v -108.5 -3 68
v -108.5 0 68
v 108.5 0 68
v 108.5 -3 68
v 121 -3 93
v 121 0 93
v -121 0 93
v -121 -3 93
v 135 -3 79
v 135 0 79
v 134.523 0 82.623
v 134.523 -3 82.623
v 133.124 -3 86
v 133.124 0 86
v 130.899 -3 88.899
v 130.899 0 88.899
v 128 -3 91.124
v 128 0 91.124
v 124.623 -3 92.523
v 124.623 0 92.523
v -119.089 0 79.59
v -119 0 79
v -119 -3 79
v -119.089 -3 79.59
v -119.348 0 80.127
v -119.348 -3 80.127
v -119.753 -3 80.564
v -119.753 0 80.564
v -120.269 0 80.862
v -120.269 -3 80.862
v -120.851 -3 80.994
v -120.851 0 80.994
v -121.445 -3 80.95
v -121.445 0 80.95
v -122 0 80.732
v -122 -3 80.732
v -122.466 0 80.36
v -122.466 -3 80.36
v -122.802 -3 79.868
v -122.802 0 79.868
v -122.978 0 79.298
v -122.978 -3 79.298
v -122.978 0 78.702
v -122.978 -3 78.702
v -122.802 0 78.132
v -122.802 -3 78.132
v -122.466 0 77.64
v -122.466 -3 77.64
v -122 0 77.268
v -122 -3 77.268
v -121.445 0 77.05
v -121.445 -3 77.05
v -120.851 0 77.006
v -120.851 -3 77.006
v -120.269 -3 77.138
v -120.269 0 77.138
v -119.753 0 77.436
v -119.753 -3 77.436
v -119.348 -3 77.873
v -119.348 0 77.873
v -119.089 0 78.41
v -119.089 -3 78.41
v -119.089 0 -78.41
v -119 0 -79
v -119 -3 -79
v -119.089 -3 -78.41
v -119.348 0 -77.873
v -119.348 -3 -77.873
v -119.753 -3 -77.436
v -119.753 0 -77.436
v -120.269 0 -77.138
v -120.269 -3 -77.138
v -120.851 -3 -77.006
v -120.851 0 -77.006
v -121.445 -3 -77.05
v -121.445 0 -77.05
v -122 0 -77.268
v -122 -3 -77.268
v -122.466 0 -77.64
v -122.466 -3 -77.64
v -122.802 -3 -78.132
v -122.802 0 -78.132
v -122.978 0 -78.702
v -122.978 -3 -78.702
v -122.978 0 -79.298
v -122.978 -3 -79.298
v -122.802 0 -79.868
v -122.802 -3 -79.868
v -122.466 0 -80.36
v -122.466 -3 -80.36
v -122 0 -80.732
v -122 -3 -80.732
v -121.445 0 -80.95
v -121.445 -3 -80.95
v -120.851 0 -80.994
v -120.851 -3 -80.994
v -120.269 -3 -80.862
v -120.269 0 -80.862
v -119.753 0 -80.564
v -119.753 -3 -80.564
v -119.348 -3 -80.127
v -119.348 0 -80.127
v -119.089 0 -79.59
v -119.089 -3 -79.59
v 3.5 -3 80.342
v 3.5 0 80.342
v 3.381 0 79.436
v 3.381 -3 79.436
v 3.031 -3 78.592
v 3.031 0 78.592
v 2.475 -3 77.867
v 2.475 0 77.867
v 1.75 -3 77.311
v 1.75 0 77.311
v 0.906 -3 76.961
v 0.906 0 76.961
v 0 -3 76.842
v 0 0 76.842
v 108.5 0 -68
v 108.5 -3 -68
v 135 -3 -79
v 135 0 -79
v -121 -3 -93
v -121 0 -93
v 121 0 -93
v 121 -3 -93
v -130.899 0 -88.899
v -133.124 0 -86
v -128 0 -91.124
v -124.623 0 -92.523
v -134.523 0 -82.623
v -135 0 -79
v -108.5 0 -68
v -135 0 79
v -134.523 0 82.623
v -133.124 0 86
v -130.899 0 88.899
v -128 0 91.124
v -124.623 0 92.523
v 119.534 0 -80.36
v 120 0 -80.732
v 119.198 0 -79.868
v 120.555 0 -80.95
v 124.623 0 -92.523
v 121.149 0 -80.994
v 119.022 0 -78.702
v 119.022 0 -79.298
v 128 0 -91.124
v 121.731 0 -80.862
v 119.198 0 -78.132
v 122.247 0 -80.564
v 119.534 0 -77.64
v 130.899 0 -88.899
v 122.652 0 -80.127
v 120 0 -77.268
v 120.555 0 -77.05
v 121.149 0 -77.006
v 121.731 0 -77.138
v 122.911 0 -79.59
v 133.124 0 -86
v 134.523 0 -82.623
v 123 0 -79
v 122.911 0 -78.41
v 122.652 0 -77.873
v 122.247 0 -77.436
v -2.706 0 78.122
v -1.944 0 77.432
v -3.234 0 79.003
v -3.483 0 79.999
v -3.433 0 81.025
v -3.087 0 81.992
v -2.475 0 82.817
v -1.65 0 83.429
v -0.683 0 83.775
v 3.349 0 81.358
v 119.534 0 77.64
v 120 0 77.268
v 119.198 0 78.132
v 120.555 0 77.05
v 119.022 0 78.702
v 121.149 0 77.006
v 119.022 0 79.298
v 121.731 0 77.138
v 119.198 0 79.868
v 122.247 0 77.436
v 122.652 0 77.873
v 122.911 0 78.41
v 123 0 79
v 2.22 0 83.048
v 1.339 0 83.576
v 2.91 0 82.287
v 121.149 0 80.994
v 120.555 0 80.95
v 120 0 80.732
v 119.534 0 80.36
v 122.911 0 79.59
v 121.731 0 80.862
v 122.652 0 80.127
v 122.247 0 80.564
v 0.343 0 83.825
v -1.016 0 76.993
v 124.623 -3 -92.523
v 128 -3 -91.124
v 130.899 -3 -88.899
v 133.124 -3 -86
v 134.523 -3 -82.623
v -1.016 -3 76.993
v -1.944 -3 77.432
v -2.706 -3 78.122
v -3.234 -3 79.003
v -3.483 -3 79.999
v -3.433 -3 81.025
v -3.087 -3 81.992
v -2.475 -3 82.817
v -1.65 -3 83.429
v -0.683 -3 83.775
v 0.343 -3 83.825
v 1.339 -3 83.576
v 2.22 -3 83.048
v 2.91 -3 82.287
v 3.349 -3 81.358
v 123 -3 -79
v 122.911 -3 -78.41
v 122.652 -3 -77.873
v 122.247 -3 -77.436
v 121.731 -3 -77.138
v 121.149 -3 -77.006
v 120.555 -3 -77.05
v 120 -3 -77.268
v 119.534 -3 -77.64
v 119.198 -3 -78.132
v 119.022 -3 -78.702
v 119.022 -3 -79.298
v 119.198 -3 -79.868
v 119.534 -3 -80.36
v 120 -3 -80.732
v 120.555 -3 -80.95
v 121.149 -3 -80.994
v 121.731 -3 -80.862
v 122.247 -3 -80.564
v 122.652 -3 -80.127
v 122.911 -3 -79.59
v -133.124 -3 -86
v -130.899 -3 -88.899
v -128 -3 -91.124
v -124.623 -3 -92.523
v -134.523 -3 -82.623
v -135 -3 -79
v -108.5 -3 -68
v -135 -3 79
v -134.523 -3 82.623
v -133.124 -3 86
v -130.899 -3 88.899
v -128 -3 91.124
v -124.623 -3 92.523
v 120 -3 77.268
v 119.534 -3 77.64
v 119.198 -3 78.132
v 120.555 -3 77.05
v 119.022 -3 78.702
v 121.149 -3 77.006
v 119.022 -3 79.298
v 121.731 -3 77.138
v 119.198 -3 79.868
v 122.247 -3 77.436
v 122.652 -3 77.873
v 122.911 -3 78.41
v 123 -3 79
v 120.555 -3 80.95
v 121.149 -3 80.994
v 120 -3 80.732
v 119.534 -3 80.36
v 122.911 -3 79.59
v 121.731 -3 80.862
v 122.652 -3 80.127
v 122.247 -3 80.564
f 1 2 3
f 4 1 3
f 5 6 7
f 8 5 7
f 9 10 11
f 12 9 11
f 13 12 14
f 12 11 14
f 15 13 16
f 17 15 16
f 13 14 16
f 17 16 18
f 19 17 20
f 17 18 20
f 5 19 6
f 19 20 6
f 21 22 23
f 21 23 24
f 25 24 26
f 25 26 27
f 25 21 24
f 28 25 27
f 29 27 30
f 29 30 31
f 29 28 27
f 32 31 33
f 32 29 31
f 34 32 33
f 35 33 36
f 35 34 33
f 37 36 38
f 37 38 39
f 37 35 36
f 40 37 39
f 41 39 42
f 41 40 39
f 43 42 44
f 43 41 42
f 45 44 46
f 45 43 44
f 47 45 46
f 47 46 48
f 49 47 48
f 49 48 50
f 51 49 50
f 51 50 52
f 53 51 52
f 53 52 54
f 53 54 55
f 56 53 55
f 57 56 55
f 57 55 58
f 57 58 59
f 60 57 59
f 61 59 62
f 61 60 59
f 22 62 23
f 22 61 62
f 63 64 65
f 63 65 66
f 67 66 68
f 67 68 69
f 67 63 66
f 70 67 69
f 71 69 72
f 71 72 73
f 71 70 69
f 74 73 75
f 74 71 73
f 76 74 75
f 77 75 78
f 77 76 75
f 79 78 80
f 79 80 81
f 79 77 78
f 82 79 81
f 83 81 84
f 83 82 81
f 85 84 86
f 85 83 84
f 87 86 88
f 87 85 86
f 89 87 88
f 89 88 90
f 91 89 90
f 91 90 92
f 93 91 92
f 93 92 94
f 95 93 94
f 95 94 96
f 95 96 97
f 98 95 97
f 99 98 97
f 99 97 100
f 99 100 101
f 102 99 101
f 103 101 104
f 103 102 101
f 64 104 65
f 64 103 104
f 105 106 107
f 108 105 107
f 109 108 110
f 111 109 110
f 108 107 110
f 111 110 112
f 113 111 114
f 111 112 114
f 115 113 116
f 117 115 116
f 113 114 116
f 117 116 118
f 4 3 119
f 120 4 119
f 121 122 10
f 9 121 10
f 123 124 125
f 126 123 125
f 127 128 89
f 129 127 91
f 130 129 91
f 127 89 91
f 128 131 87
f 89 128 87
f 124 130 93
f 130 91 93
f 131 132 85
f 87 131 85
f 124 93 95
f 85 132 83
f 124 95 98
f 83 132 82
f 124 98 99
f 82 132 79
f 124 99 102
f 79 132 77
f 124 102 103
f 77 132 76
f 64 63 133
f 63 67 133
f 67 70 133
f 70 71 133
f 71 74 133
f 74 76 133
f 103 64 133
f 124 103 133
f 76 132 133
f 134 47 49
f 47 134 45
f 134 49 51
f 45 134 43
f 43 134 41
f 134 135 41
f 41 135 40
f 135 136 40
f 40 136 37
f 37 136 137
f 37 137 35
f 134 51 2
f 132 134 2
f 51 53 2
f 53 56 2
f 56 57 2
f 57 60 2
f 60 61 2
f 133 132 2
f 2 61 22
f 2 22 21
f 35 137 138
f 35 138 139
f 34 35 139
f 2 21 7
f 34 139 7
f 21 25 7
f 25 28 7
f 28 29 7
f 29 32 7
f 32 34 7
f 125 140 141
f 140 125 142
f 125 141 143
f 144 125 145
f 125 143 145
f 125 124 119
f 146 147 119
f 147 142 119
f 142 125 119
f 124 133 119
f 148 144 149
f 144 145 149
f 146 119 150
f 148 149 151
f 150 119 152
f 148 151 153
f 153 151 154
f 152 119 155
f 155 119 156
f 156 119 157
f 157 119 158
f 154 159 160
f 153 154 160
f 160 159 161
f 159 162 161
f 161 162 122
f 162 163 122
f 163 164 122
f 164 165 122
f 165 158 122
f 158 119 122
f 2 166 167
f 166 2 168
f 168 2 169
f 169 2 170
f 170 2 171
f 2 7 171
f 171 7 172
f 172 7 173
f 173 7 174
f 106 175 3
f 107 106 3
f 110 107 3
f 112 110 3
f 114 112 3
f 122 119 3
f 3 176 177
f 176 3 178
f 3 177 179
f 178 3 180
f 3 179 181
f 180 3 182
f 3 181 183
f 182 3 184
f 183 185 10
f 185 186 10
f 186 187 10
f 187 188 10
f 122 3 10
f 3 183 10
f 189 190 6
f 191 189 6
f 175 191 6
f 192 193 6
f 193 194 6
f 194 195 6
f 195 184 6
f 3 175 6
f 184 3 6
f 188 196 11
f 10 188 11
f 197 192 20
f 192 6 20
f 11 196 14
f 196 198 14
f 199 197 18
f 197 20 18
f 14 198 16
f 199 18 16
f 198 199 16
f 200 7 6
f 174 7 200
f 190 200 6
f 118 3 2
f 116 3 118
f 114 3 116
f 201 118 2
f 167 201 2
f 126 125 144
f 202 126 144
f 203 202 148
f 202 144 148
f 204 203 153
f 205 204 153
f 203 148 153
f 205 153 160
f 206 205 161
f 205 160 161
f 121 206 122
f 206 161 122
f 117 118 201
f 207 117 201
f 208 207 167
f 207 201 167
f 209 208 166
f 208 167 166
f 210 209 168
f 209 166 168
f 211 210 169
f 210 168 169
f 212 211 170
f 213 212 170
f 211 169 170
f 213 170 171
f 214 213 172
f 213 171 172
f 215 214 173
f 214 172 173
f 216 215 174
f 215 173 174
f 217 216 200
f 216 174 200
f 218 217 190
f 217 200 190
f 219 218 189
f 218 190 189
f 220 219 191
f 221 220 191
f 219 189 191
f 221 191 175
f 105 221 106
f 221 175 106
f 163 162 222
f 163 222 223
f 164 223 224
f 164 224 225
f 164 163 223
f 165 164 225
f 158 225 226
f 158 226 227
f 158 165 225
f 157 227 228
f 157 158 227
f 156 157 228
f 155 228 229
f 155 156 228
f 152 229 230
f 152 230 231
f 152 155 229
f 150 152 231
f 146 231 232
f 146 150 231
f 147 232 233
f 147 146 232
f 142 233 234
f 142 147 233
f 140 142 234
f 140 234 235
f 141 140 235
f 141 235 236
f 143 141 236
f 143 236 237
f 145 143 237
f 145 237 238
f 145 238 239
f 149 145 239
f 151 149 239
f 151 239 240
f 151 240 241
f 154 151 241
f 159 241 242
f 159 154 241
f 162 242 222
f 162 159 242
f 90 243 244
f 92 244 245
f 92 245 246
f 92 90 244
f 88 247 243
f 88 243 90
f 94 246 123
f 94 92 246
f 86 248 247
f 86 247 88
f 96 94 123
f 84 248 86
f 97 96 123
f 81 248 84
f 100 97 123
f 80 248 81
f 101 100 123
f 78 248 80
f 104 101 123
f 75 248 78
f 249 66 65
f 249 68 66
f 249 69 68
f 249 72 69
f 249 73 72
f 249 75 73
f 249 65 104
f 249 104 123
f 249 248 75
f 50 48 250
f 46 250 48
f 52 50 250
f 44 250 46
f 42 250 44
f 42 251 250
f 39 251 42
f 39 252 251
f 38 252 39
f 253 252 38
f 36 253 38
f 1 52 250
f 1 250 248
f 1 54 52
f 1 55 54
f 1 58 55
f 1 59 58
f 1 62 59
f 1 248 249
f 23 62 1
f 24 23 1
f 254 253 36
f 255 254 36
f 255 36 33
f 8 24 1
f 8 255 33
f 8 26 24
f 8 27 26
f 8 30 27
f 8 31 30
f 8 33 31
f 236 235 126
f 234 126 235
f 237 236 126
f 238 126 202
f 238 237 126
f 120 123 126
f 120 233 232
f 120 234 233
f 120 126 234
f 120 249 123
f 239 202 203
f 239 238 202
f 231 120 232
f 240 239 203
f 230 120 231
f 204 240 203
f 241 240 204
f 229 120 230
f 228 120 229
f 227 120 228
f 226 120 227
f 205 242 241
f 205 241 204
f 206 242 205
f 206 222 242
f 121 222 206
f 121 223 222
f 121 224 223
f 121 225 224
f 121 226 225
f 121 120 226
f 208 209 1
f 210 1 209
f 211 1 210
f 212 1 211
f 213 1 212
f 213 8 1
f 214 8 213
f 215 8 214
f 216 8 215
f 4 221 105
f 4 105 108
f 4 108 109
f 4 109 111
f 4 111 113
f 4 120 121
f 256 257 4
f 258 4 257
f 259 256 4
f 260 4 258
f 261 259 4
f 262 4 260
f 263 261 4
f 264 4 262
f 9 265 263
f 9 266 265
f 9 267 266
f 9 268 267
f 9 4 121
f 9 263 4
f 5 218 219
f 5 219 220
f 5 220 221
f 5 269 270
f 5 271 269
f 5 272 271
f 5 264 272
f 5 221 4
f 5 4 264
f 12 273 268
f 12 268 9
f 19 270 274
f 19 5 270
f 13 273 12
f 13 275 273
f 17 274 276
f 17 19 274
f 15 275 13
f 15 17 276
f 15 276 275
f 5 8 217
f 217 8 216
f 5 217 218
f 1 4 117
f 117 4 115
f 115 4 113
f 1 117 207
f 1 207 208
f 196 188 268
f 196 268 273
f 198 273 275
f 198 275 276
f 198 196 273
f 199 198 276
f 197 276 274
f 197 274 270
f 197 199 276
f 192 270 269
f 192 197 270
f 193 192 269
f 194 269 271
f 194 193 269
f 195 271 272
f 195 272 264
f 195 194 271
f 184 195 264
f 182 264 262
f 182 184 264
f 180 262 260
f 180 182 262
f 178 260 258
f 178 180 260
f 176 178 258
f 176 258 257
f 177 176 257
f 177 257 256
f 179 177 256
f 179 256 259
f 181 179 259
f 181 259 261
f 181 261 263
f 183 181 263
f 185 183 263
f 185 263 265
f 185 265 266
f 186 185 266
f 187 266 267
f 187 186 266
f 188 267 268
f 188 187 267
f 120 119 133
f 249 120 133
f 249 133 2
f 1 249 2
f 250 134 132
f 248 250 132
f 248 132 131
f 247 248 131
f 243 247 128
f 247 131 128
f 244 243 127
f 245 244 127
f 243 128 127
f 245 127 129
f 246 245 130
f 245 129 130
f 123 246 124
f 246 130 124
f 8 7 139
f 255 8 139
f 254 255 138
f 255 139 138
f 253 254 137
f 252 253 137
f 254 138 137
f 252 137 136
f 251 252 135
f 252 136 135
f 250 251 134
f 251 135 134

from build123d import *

# Parameters (mm, degrees)
F0_R     = 2
F1_DEPTH = 3


with BuildPart() as f1:
    # F0 (on Front) → F1 (new body)
    with BuildSketch(Plane.XZ):
        with BuildLine():
            Line((-121, -93), (121, -93))
            ThreePointArc((121, -93), (130.899495, -88.899495), (135, -79))
            Line((135, -79), (135, 79))
            ThreePointArc((135, 79), (130.899495, 88.899495), (121, 93))
            Line((121, 93), (-121, 93))
            ThreePointArc((-121, 93), (-130.899495, 88.899495), (-135, 79))
            Line((-135, 79), (-135, -79))
            ThreePointArc((-135, -79), (-130.899495, -88.899495), (-121, -93))
        make_face()
        with Locations((-121, -79)):
            Circle(F0_R, mode=Mode.SUBTRACT)
        with Locations((121, -79)):
            Circle(F0_R, mode=Mode.SUBTRACT)
        with Locations((-121, 79)):
            Circle(F0_R, mode=Mode.SUBTRACT)
        Polygon((108.5, 68), (108.5, -68), (-108.5, -68), (-108.5, 68), (0, 68), align=None, mode=Mode.SUBTRACT)
        with BuildLine():
            ThreePointArc((3.5, 80.342077), (2.474874, 77.867203), (0, 76.842077))
            ThreePointArc((0, 76.842077), (-2.474874, 82.81695), (3.5, 80.342077))
        make_face(mode=Mode.SUBTRACT)
        with Locations((121, 79)):
            Circle(F0_R, mode=Mode.SUBTRACT)
    extrude(amount=F1_DEPTH)


solid = f1.part
